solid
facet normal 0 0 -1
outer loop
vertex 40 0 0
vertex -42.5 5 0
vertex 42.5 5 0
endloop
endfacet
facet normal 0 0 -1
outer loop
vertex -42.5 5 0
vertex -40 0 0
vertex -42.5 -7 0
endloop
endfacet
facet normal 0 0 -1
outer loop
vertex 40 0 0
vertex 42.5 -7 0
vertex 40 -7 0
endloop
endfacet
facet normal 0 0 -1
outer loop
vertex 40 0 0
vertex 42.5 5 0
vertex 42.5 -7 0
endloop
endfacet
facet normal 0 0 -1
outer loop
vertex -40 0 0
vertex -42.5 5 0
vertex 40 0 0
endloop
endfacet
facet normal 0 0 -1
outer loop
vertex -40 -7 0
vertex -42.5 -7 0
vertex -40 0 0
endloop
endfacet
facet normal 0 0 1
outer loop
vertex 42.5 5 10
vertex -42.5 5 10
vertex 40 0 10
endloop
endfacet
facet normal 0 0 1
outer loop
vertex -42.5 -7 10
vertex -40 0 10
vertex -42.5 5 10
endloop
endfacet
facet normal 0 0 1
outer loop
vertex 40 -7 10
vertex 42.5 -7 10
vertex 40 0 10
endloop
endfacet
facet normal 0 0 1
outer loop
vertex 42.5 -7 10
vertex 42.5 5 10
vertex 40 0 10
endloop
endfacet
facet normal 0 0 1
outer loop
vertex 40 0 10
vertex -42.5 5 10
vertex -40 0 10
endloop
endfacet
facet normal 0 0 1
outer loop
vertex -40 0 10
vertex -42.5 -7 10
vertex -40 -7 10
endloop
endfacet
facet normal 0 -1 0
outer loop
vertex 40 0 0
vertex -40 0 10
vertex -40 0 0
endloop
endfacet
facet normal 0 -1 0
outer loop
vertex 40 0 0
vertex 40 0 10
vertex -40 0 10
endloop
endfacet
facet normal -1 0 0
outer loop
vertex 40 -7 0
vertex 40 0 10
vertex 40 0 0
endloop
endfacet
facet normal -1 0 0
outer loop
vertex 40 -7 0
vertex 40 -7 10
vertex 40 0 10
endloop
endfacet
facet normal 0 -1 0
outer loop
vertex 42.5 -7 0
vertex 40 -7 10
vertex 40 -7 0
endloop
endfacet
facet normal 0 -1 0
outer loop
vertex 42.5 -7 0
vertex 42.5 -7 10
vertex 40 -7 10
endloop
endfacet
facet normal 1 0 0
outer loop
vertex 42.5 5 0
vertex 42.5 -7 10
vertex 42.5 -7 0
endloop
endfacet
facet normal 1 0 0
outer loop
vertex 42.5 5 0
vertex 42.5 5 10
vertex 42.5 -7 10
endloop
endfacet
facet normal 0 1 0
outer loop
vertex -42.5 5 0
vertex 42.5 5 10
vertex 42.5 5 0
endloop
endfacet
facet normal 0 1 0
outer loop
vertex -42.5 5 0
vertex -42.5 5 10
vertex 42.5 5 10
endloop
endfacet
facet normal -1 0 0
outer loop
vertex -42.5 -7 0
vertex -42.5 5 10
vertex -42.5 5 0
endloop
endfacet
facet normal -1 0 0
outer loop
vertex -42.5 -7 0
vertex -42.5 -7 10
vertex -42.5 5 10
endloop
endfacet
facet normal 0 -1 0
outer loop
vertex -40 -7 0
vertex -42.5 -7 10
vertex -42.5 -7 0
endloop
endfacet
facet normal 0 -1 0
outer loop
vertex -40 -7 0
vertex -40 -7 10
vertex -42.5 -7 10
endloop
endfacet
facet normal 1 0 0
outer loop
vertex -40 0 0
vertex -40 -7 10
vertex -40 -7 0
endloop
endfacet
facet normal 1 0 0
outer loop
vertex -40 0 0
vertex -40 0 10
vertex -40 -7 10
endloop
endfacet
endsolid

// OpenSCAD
// frame_width_gauge — the width equivalent of frame_length_gauge. One job.
//
// A 10 mm strip carrying the two skirt walls at their real spacing, and nothing
// else. Lay it across the TOP of the supply; both skirts should drop over the
// sides snug, no rock.
//
// Span is 2*SKIRT_IN, the same expression the real frame uses.
//
// NOTE: this checks the case fit ONLY. It does not check the plate pocket —
// frame_test_section does that, at the cost of being a full four-sided slice.
//
// PRINT: flat as rendered. Profile extruded in Z: no overhangs, no supports.
include <../shortkiller_common.scad>

GAUGE_D = 10.0;   // strip depth along the case
SPINE_T =  5.0;

SPAN = 2 * SKIRT_IN;   // what has to clear the case

linear_extrude(GAUGE_D)
    polygon([
        [-SKIRT_OUT, -SKIRT_D],
        [-SKIRT_IN,  -SKIRT_D],
        [-SKIRT_IN,   0],
        [ SKIRT_IN,   0],
        [ SKIRT_IN,  -SKIRT_D],
        [ SKIRT_OUT, -SKIRT_D],
        [ SKIRT_OUT,  SPINE_T],
        [-SKIRT_OUT,  SPINE_T],
    ]);

echo(str("clear span between skirts = ", SPAN, " mm  (case ", CASE_W, ")"));
